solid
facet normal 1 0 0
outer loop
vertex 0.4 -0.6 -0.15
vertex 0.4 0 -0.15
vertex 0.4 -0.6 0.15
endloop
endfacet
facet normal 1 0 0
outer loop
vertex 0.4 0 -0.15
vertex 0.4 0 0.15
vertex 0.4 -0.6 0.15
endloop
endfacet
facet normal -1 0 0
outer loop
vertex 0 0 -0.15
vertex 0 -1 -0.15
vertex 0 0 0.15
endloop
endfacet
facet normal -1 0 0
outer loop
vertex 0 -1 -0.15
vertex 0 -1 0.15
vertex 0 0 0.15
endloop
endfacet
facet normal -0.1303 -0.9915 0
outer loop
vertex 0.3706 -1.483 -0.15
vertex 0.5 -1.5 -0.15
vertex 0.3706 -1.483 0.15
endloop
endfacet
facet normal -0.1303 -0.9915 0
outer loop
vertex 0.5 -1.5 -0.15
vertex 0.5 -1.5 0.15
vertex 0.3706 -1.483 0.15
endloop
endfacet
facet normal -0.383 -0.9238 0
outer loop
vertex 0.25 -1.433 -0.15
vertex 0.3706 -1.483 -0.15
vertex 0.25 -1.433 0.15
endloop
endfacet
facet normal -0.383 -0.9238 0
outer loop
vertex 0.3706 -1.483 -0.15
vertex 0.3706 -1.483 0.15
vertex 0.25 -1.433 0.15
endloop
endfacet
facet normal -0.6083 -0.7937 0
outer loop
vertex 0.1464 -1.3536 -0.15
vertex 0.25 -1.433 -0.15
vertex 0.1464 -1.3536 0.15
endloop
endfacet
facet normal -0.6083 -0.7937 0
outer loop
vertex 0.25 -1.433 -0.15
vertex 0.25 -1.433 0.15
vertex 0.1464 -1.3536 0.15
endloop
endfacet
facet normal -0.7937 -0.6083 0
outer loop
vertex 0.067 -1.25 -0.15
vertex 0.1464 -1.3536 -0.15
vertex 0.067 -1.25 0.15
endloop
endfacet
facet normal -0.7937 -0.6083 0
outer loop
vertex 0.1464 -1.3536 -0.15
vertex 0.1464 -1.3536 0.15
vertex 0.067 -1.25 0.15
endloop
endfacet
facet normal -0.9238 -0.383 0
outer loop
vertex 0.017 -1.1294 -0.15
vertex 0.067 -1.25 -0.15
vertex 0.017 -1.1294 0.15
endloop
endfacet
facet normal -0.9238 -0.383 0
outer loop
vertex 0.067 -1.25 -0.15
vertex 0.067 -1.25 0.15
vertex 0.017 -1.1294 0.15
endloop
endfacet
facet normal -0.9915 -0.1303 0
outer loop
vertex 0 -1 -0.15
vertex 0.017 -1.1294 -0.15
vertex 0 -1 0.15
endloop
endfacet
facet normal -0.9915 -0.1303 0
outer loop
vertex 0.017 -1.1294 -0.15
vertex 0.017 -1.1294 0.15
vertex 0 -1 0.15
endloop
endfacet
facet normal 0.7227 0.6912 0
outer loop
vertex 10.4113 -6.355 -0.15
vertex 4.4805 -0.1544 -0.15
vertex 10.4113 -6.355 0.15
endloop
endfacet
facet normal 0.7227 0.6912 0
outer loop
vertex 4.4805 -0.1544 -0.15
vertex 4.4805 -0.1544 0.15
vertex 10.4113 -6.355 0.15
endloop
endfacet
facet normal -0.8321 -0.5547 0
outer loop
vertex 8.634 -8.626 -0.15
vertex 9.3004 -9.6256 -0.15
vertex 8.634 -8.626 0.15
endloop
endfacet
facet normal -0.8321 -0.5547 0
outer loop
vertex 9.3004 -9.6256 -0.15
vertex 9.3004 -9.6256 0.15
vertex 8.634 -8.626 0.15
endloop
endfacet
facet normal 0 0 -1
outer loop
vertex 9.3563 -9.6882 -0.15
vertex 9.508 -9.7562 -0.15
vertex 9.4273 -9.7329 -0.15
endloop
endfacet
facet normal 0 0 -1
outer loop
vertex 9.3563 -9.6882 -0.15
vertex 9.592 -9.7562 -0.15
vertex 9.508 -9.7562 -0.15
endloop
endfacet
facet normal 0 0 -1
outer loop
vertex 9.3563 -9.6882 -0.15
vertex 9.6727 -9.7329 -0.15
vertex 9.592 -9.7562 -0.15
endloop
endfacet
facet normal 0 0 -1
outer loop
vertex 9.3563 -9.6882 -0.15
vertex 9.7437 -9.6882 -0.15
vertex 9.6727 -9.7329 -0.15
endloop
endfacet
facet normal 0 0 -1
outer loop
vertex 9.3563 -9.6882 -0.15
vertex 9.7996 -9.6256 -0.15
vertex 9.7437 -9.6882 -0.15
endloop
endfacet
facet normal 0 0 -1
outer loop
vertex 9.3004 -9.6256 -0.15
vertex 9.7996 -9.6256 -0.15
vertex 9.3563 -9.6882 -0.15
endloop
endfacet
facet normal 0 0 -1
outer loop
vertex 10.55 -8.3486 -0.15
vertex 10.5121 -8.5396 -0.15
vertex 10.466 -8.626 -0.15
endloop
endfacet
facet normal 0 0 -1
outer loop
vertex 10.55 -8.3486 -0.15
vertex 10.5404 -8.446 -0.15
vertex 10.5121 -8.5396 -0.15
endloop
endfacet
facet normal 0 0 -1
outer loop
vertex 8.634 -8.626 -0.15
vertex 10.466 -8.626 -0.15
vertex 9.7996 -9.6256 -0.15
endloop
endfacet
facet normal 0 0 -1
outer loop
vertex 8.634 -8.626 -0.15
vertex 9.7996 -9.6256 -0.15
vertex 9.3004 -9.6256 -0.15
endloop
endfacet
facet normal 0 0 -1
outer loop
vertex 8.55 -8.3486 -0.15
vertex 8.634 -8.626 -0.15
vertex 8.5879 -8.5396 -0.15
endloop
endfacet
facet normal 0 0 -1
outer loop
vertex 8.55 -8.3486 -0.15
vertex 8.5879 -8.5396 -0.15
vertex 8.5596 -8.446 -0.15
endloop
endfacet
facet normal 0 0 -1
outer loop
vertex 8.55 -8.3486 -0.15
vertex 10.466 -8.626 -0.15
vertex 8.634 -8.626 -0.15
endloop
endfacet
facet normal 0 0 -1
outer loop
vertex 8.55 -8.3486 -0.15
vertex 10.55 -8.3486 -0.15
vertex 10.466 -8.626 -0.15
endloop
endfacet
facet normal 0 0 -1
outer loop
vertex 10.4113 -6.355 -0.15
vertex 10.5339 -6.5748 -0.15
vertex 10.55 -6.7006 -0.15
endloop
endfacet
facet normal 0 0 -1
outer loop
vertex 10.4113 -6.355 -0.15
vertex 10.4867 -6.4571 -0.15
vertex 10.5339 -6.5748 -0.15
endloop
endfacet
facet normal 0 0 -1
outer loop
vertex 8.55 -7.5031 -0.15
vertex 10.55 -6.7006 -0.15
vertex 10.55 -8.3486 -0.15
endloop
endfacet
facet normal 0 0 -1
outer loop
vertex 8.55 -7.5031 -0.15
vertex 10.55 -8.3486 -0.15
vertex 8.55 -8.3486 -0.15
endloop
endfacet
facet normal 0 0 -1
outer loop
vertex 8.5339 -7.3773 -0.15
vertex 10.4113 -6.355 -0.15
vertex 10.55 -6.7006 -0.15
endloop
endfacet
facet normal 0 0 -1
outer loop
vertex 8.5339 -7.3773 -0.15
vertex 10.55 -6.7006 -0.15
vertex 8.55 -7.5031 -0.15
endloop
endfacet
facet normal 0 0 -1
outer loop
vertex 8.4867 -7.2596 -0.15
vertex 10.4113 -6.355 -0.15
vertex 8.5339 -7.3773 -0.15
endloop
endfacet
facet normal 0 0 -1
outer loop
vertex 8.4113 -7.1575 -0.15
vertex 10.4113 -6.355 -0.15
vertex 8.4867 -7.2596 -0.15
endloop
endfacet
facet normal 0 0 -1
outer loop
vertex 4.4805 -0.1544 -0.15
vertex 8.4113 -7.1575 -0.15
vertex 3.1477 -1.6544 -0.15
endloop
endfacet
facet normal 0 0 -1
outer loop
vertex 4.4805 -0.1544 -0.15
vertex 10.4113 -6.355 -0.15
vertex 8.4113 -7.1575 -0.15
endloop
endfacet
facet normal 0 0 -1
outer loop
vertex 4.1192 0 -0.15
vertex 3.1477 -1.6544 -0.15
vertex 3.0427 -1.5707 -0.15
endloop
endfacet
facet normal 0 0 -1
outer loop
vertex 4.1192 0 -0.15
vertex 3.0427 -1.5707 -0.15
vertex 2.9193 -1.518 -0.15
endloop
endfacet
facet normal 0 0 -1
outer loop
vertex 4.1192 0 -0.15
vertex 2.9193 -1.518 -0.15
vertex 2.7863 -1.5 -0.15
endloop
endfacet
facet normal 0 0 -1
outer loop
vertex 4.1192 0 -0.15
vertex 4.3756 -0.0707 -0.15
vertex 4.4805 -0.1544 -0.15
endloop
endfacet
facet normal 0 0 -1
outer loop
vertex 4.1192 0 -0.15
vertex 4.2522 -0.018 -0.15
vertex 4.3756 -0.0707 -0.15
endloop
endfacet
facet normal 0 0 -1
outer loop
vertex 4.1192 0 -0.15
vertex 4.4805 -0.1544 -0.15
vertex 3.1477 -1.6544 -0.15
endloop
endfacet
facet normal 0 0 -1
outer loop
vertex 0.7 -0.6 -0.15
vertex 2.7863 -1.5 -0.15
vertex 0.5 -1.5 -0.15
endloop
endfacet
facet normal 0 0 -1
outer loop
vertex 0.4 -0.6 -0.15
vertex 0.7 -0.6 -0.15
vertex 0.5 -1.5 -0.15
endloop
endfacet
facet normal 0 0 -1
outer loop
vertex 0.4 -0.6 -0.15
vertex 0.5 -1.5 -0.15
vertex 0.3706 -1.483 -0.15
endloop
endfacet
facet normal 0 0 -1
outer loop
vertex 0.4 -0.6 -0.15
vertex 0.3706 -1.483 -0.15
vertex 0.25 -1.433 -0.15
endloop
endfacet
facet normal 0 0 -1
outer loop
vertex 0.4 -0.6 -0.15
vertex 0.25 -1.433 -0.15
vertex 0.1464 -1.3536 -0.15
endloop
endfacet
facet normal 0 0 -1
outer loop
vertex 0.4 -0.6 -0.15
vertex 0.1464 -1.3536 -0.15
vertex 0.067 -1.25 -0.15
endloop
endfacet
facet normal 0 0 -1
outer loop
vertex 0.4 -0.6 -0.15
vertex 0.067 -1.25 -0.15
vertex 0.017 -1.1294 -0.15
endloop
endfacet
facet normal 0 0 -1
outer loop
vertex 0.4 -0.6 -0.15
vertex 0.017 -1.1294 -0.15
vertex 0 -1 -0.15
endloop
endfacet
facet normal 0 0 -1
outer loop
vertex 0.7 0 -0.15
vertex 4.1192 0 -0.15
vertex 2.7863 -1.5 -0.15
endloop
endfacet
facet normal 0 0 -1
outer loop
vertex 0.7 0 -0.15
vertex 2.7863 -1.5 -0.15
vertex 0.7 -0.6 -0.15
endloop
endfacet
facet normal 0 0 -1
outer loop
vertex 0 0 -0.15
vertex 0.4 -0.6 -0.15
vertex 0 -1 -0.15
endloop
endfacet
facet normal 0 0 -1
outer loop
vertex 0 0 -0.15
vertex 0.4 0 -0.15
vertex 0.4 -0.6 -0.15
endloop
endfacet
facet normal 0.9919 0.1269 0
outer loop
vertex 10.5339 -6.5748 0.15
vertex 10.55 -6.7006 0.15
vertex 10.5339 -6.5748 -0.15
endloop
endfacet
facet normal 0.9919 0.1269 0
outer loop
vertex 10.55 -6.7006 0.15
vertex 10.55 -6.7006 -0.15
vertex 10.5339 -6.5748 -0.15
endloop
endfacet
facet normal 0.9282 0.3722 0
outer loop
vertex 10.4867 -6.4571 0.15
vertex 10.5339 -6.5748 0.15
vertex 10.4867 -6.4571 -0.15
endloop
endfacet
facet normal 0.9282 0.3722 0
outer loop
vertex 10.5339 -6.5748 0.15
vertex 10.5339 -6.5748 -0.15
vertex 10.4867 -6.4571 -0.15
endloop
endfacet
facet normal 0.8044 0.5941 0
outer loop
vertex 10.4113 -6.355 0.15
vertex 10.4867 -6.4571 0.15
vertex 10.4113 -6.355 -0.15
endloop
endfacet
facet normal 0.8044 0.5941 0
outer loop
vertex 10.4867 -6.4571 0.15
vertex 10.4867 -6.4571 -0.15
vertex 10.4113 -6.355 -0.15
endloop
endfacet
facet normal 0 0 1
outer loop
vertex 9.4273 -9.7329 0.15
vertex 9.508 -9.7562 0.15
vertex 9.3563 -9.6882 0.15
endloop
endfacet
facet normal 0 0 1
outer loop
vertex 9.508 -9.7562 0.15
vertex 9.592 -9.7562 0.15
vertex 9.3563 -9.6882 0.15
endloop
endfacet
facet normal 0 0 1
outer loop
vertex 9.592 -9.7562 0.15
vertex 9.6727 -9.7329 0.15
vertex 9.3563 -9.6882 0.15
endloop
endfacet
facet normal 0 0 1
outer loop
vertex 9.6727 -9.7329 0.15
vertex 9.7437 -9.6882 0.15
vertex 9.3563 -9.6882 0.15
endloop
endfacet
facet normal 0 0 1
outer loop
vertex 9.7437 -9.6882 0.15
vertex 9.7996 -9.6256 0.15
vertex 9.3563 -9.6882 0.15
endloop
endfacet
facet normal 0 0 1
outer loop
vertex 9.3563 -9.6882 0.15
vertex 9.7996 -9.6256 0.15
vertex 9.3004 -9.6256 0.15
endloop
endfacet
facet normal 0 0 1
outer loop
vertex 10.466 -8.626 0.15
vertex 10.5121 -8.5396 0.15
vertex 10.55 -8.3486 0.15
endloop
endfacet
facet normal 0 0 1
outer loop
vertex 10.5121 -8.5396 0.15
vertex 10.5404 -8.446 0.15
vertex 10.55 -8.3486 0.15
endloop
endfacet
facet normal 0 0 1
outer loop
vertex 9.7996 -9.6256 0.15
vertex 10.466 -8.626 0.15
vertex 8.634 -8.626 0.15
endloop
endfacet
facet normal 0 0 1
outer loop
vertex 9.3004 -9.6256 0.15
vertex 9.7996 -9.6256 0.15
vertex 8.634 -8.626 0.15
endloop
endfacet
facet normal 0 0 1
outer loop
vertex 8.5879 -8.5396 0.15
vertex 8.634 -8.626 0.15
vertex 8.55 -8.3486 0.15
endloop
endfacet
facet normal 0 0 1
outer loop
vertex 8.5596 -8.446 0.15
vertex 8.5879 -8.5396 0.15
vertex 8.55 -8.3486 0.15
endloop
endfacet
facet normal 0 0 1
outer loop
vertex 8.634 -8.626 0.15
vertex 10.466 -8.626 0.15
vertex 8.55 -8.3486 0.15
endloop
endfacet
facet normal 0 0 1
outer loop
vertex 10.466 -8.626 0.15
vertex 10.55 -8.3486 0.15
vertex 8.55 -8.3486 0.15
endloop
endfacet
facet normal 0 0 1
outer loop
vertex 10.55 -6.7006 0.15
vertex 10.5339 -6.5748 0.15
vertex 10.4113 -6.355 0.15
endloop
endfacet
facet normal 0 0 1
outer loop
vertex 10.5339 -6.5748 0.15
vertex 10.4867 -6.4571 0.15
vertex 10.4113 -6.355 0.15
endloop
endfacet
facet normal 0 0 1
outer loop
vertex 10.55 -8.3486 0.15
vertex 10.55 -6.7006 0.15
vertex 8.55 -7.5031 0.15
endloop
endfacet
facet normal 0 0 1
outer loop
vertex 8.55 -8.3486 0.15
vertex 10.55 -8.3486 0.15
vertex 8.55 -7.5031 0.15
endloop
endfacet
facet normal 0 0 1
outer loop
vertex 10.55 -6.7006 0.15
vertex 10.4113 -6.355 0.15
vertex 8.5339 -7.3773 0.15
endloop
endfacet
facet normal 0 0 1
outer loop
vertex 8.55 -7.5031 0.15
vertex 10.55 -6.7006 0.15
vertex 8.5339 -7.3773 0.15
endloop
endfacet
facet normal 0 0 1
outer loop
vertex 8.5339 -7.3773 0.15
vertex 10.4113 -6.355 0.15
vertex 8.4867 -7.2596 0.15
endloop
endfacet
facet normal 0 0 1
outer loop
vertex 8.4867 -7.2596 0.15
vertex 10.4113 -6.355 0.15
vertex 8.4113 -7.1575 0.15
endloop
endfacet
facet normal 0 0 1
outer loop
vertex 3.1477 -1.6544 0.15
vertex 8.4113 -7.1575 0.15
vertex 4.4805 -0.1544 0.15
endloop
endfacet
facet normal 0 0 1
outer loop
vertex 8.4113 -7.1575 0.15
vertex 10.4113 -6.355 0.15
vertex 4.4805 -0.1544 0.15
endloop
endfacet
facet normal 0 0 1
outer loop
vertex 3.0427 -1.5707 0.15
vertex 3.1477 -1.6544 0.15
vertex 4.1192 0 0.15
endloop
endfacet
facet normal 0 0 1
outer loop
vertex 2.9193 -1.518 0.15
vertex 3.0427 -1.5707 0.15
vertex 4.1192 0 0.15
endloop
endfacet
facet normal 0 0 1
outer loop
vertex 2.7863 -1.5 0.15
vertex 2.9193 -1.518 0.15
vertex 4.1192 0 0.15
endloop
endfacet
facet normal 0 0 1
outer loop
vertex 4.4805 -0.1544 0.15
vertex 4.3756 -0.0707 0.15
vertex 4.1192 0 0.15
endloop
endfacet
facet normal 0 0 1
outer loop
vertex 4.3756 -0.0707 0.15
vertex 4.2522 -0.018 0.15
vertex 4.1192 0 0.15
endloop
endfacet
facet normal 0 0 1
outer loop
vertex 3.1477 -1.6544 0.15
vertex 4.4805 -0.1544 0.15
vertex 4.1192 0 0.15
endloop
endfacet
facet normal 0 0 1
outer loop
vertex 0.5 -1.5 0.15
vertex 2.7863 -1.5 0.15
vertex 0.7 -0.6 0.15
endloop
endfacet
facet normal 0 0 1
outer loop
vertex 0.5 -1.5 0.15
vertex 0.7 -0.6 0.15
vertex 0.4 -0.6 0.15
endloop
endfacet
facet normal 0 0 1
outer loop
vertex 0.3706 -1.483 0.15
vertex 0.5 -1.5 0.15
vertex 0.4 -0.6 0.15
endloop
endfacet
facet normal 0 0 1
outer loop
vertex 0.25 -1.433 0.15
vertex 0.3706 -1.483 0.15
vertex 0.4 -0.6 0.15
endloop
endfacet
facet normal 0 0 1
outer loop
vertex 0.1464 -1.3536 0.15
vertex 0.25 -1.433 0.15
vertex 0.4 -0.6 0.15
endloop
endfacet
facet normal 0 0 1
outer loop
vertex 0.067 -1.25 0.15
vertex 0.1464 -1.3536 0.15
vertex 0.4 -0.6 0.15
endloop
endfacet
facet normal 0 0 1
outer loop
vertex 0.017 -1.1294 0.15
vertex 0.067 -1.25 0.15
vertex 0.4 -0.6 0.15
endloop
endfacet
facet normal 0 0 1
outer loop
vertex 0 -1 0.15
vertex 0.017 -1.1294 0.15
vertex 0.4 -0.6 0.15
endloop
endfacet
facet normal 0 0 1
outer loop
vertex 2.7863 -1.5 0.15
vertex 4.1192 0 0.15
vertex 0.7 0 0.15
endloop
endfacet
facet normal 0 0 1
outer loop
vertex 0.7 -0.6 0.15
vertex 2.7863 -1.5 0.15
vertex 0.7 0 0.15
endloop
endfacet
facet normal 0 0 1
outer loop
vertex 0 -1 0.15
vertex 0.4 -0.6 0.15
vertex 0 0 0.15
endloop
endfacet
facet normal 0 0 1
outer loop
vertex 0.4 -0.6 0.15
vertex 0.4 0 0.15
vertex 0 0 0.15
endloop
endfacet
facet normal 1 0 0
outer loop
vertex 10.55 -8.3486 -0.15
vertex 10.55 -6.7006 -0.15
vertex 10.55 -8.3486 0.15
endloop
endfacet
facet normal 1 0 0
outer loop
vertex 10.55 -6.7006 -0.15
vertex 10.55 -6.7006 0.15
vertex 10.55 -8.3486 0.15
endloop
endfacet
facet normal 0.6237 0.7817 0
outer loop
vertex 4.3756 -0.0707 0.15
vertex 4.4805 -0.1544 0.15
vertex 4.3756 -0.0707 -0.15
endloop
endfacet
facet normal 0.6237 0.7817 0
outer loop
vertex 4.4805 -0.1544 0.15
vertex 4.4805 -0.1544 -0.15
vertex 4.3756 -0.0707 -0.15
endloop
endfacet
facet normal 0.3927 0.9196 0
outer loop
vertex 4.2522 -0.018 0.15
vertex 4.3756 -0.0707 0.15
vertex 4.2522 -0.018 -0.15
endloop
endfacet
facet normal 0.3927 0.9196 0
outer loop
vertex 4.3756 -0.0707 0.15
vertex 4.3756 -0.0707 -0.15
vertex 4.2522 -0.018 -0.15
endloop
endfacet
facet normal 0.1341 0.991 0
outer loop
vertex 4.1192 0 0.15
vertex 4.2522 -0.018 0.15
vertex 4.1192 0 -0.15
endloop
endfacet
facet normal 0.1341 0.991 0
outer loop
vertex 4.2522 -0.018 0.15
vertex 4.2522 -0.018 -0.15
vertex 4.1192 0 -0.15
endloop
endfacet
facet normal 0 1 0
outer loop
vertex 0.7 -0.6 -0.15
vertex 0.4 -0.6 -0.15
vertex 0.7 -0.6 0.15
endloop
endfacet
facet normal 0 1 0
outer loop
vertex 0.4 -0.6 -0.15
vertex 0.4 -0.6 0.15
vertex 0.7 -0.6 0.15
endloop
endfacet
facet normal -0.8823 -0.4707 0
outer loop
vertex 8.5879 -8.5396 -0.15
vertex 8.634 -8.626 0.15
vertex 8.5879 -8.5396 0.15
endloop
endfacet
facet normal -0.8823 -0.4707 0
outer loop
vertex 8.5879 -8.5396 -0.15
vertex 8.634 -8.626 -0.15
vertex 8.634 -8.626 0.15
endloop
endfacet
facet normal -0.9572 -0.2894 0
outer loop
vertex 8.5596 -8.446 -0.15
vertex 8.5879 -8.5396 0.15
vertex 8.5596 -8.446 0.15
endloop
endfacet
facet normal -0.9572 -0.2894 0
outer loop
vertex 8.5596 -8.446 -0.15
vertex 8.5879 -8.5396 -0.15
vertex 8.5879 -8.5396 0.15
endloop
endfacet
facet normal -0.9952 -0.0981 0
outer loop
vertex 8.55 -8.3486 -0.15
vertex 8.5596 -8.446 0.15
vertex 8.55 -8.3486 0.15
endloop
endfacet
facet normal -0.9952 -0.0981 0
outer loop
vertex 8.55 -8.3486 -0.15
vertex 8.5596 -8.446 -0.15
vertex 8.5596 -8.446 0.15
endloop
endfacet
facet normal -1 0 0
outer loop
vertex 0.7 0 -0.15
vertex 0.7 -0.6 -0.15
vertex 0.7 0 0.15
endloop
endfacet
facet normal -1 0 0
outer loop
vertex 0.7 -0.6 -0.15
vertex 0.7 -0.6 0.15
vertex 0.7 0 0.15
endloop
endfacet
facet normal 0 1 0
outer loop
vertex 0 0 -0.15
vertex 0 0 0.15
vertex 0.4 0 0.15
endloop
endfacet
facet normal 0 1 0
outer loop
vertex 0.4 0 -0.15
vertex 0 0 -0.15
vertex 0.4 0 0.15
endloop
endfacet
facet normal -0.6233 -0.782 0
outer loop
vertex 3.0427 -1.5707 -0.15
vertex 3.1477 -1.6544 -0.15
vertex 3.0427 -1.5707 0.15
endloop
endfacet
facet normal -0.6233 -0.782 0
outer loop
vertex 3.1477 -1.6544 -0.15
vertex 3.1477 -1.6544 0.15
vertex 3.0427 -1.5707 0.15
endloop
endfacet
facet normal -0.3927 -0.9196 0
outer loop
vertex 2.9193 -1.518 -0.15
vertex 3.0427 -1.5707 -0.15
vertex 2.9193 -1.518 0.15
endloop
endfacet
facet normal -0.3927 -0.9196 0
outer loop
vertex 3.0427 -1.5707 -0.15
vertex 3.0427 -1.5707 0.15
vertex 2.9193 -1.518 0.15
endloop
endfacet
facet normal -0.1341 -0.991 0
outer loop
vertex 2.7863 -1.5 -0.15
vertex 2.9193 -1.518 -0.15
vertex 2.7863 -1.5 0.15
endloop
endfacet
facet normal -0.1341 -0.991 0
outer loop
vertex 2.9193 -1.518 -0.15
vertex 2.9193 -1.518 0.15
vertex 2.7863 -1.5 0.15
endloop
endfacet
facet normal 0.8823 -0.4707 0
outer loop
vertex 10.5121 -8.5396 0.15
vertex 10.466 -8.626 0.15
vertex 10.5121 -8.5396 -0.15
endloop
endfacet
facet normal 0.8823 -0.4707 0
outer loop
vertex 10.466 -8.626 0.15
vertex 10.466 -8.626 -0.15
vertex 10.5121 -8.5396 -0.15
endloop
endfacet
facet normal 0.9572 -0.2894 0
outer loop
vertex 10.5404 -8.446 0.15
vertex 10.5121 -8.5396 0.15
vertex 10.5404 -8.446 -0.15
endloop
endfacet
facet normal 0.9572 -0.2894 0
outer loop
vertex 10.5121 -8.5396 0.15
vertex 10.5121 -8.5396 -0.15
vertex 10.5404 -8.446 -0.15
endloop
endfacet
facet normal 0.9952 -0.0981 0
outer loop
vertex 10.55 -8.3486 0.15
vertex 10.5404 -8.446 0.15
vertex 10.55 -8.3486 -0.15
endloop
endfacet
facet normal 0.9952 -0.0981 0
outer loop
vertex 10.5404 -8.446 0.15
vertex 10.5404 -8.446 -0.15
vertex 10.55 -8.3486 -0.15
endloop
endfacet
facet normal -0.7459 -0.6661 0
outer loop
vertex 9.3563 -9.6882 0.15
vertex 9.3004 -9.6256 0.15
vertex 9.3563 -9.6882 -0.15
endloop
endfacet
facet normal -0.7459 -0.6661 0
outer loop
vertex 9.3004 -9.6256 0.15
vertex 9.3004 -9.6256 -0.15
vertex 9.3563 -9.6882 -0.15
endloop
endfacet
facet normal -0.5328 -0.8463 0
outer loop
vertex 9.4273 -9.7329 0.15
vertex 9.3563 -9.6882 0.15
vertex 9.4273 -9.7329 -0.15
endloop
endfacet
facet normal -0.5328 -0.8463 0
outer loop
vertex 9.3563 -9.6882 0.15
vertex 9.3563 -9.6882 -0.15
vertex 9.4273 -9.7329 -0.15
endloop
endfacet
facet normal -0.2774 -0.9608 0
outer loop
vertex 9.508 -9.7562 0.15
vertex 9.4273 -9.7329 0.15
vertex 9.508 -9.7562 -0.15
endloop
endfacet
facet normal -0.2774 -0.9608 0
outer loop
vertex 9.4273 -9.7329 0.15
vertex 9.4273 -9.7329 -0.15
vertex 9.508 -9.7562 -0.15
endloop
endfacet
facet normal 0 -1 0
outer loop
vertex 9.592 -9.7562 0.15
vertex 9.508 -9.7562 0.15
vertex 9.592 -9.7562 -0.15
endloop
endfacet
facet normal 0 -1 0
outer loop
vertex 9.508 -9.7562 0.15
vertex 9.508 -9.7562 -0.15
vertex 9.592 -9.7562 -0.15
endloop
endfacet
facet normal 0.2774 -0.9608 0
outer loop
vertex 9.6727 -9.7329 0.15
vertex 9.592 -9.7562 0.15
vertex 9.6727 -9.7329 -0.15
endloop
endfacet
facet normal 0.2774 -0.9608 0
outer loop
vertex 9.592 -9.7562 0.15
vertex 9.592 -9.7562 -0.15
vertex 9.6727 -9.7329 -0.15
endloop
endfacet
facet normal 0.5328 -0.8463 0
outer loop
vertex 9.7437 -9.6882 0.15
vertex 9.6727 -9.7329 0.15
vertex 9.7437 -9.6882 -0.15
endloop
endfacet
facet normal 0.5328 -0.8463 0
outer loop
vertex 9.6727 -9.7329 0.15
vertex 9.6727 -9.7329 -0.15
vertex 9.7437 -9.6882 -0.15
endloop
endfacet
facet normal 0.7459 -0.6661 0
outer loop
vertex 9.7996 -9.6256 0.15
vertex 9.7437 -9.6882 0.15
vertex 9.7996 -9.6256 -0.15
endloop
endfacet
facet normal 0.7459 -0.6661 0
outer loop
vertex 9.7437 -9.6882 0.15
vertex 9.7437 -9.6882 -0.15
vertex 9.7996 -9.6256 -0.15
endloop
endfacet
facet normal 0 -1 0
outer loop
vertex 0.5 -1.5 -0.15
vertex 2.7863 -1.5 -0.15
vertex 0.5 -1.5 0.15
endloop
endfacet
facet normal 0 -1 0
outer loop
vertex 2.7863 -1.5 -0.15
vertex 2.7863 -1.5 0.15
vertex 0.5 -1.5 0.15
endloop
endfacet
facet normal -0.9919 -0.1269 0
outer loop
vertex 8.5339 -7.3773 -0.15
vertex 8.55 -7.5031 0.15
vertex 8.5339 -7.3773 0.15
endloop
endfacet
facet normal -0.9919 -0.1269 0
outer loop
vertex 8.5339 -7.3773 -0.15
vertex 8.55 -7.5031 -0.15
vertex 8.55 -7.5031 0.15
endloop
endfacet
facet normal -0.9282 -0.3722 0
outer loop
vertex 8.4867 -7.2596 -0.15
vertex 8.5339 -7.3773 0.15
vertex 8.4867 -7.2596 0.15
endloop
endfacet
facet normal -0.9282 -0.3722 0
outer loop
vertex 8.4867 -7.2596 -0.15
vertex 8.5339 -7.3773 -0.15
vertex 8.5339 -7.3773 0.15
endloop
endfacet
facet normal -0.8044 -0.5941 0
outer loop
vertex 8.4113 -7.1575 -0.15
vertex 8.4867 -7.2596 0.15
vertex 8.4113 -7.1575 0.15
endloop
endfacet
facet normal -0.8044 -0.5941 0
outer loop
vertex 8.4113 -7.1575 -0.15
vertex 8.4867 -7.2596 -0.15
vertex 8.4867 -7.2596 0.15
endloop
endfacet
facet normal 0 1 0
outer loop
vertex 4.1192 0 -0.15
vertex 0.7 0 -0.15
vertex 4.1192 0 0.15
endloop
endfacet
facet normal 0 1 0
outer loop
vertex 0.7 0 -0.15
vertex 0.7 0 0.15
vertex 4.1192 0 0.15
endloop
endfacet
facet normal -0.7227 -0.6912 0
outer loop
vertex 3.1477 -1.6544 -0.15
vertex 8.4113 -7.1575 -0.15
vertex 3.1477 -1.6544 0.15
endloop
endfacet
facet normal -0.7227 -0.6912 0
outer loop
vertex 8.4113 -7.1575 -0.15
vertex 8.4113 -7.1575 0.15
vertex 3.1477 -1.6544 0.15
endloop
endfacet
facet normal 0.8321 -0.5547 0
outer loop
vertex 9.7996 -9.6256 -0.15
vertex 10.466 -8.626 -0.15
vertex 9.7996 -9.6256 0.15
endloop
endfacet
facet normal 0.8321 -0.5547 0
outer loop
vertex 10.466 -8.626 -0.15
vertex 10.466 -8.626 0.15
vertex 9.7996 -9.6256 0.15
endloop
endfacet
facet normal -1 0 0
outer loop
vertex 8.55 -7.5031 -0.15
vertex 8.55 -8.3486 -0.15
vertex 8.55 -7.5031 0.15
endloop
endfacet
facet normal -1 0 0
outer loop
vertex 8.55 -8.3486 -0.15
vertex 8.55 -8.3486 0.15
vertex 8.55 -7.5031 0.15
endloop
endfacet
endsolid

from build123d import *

# Parameters (mm, degrees)
BOSS_EXTRUDE1_DEPTH = 0.15
FILLET1_R           = 0.3
FILLET2_R           = 0.5


with BuildPart() as part:
    # Sketch1 → Boss-Extrude1 (new, symmetric)
    with BuildSketch(Plane.XY):
        Polygon((0, 0), (0.4, 0), (0.4, -0.6), (0.7, -0.6), (0.7, 0), (4.332844343, 0), (10.55, -6.5), (10.55, -8.5), (9.55, -10), (8.55, -8.5), (8.55, -7.302492649), (3, -1.5), (0, -1.5), align=None)
    extrude(amount=BOSS_EXTRUDE1_DEPTH, both=True)

    # Fillet1
    fillet1_edges = [part.edges().sort_by_distance(p)[0] for p in [
        (9.55, -10, 0),
    ]]
    fillet(fillet1_edges, radius=FILLET1_R)

    # Fillet2
    fillet2_edges = [part.edges().sort_by_distance(p)[0] for p in [
        (4.332844343, 0, 0),
        (10.55, -6.5, 0),
        (10.55, -8.5, 0),
        (8.55, -8.5, 0),
        (8.55, -7.302492649, 0),
        (3, -1.5, 0),
        (0, -1.5, 0),
    ]]
    fillet(fillet2_edges, radius=FILLET2_R)


solid = part.part
